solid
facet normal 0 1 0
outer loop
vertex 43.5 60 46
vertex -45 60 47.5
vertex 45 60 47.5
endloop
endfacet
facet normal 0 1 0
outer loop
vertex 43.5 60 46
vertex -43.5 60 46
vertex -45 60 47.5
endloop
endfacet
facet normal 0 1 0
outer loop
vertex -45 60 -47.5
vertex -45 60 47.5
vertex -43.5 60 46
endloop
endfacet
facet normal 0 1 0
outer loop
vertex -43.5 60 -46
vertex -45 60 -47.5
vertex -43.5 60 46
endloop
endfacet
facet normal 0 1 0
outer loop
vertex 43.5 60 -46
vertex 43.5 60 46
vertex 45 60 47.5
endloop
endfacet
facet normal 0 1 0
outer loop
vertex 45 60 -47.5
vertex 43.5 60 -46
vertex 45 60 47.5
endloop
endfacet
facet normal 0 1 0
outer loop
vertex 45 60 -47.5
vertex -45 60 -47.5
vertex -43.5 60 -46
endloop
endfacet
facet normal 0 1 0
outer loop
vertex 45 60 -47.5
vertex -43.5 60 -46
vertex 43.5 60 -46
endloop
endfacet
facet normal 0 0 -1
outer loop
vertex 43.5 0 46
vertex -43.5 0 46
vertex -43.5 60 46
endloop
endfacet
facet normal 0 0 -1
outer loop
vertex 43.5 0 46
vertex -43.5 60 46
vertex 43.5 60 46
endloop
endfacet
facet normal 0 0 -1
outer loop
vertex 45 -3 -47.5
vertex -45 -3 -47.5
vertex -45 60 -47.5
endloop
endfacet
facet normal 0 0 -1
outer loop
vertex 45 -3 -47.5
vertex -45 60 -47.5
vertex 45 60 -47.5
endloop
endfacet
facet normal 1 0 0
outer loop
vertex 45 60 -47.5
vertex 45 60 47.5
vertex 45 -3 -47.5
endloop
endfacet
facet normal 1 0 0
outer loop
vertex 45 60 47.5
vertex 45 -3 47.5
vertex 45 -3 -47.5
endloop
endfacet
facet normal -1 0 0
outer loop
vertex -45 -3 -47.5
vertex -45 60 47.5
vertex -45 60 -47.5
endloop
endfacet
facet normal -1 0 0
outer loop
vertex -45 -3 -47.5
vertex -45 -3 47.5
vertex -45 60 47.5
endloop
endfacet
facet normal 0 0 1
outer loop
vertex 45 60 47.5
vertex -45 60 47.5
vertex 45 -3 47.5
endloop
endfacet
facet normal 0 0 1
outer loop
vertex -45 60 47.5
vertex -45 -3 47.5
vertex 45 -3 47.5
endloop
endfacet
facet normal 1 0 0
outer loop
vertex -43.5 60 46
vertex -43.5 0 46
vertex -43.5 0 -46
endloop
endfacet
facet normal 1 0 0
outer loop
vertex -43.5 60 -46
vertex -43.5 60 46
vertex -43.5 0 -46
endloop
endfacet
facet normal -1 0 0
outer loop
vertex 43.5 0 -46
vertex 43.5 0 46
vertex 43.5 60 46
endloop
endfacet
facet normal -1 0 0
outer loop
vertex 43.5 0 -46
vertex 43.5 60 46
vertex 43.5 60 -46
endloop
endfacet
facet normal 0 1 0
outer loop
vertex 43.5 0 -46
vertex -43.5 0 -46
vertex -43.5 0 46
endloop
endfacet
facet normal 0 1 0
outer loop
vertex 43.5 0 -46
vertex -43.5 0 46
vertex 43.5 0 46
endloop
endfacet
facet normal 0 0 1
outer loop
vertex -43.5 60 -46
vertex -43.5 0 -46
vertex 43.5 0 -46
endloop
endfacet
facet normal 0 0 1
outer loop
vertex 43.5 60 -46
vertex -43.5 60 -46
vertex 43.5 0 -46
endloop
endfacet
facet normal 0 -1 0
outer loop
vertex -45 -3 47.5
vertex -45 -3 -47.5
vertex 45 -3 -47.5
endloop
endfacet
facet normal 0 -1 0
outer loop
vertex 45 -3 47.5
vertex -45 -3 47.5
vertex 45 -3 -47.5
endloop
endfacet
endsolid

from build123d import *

# Parameters (mm, degrees)
SKETCH_1_W      = 90
SKETCH_1_H      = 95
EXTRUDE_1_DEPTH = 3
SKETCH_2_W      = 90
SKETCH_2_H      = 95
SKETCH_2_W_2    = 87
SKETCH_2_H_2    = 92
EXTRUDE_2_DEPTH = 60


with BuildPart() as part:
    # 草图1 → 凸台-拉伸1 (new body)
    with BuildSketch(Plane(origin=(0, 0, 0), x_dir=(1, 0, 0), z_dir=(0, 1, 0))):
        Rectangle(SKETCH_1_W, SKETCH_1_H)
    extrude(amount=-EXTRUDE_1_DEPTH)

    # 草图2 → 凸台-拉伸2 (add)
    with BuildSketch(Plane(origin=(0, 0, 0), x_dir=(1, 0, 0), z_dir=(0, 1, 0))):
        Rectangle(SKETCH_2_W, SKETCH_2_H)
        Rectangle(SKETCH_2_W_2, SKETCH_2_H_2, mode=Mode.SUBTRACT)
    extrude(amount=EXTRUDE_2_DEPTH)


solid = part.part
